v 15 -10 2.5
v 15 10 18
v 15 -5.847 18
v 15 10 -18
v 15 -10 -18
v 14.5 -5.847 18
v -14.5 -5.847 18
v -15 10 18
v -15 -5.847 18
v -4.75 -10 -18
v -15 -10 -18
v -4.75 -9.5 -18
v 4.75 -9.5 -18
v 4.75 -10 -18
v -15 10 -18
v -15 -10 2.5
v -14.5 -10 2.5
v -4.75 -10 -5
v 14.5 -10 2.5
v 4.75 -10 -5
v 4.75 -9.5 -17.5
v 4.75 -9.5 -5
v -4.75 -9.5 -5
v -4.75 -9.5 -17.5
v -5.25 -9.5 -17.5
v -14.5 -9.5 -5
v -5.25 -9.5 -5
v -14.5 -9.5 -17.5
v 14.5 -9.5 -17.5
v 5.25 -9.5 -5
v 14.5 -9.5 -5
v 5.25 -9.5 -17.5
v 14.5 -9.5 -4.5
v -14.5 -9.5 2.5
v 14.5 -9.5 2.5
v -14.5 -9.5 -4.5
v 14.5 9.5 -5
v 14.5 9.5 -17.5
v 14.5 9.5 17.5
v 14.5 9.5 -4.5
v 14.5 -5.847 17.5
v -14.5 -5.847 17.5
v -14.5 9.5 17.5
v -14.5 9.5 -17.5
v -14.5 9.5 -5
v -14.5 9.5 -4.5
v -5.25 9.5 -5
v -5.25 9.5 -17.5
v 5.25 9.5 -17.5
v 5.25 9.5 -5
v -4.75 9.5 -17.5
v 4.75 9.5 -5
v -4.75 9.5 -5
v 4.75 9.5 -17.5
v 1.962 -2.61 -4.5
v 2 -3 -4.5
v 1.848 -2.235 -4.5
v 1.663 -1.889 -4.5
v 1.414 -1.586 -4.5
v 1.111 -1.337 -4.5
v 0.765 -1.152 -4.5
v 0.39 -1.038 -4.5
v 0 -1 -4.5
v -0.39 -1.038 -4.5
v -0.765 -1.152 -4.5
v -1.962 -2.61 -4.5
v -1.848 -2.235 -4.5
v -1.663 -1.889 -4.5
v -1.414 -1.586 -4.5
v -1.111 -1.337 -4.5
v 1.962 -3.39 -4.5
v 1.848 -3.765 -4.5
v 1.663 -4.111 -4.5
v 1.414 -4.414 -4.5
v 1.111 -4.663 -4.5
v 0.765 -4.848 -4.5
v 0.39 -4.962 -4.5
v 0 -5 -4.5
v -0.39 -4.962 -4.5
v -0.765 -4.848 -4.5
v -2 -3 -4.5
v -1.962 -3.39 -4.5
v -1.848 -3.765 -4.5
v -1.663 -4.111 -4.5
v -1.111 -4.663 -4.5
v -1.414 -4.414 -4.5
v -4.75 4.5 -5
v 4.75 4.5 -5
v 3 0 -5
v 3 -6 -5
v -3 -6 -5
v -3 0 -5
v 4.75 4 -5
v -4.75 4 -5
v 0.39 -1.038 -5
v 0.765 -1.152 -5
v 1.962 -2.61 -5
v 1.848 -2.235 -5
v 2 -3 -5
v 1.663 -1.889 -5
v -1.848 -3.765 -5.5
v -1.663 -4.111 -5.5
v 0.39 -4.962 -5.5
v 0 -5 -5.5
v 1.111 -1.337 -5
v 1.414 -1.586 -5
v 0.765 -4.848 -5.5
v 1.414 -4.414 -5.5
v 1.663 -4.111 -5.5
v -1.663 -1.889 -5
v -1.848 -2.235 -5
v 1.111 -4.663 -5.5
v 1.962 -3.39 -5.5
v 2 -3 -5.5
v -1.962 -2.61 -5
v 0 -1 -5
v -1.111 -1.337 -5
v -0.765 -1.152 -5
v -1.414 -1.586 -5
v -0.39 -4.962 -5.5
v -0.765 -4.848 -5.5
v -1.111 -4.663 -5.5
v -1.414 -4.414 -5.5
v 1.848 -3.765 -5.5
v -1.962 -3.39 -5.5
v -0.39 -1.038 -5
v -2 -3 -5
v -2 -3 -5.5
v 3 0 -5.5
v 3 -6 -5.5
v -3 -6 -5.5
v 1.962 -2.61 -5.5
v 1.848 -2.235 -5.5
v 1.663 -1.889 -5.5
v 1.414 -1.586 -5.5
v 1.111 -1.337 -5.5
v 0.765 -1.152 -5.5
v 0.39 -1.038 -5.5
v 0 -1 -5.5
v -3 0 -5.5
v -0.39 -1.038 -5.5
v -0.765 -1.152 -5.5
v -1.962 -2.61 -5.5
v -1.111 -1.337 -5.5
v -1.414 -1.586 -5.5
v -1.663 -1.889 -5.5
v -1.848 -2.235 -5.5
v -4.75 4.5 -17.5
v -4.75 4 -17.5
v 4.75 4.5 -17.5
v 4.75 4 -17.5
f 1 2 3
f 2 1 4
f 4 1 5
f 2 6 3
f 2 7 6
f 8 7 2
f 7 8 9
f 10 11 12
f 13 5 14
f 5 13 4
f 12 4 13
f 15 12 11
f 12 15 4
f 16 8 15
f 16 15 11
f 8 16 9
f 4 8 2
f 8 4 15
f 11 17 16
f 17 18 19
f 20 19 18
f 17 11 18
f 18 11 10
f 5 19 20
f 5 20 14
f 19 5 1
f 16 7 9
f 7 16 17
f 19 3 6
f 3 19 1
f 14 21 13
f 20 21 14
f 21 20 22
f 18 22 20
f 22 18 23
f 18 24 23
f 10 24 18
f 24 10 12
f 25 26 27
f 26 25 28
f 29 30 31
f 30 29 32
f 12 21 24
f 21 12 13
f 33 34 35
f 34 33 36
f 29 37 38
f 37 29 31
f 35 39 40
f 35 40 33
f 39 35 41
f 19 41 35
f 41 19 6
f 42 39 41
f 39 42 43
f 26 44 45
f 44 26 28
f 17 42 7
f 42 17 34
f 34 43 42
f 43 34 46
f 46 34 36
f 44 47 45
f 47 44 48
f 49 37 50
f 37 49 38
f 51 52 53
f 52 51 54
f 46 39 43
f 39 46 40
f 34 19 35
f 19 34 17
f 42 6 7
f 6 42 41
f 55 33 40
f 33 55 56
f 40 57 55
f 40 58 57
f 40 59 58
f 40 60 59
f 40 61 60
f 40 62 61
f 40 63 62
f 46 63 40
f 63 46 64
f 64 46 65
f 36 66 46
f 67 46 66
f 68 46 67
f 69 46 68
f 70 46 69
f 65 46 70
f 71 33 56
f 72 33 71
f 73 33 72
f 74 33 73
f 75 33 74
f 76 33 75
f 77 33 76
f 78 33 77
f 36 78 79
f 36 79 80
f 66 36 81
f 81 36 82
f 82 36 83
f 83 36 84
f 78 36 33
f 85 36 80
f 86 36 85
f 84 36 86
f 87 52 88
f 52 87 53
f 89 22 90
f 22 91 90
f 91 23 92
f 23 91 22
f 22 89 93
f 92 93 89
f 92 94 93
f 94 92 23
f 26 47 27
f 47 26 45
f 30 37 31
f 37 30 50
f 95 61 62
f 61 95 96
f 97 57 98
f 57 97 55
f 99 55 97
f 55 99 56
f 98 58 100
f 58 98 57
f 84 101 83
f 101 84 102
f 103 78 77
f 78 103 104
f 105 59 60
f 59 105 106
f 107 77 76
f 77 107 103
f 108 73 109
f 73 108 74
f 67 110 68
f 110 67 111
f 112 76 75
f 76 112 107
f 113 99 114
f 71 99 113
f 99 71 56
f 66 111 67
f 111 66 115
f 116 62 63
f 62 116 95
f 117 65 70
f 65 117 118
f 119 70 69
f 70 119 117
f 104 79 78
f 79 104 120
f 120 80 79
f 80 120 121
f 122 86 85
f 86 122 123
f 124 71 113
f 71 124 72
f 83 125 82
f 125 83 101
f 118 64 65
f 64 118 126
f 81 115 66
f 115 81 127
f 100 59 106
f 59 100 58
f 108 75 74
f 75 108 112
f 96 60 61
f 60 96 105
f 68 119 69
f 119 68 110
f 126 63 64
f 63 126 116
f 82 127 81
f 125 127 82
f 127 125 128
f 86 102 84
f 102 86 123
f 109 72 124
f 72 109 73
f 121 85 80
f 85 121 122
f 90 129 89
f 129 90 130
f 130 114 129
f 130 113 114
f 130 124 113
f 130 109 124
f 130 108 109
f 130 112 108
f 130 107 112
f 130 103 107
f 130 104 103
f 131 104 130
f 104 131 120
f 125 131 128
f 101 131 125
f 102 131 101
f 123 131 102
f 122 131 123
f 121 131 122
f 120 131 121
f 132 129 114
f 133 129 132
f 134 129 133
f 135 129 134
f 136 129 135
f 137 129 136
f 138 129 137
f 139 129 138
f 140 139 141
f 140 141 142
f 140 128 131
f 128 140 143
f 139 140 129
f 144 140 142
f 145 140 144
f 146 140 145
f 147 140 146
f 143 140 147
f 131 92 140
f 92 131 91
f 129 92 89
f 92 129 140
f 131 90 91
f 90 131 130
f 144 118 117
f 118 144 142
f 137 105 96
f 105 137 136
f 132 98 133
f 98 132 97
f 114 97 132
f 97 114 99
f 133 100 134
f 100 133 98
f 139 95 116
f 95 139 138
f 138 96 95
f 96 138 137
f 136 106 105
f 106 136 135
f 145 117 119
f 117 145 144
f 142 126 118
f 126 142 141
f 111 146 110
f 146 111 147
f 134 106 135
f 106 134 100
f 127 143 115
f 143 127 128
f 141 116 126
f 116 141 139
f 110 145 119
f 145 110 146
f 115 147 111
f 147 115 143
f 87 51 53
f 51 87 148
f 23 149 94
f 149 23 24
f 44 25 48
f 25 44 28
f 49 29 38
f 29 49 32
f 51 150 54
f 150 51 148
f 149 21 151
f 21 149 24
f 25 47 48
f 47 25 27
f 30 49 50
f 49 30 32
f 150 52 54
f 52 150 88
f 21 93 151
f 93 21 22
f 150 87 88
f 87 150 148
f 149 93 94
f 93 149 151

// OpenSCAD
// Unit: inches
cabinet_width = 30;
cabinet_depth = 20;
cabinet_height = 36;
wall_thickness = 0.5;
door_height_y = 15;
door_angle = 15;
platform_y = 13;
reclaimed_powder_chute_diameter = 4;
reclaimed_powder_chute_inset = 5;
reclaimed_powder_channel_width = 9.5;
reclaimed_powder_channel_depth = 14;

module cabinet_top_and_walls(inset)
{
  door_cutout_depth = cabinet_depth + cabinet_height;
  door_cutout_height = cabinet_height / sin(door_angle) + 10;

  difference()
  {
    translate([0, 0, -0.5 * inset])
    cube([cabinet_width - 2 * inset, cabinet_depth - 2 * inset, cabinet_height - inset], center = true);
    
    translate([0, -0.5 * cabinet_depth, 0.5 * cabinet_height - wall_thickness - door_height_y])
    rotate([-door_angle, 0, 0])
    translate([0, -0.5 * door_cutout_depth, 0])
    cube([cabinet_width + 10, door_cutout_depth, door_cutout_height], center = true);
    
    translate([0, -0.5 * cabinet_depth, 0.5 * platform_y - 0.5 * cabinet_height])
    cube([reclaimed_powder_channel_width, 2 * wall_thickness, platform_y], center = true);
  }
}

cutaway_height = door_height_y + wall_thickness;
cutaway_inset = cutaway_height * tan(door_angle);

module opening()
{  
  translate([0, -cabinet_depth + cutaway_inset, 0.5 * cabinet_height- 0.5 * door_height_y - 0.5 * wall_thickness])
  cube([cabinet_width - 2 * wall_thickness, cabinet_depth, cutaway_height], center = true);
}

module platform()
{
  difference()
  {
    translate([0, 0, 0.5 * wall_thickness - 0.5 * cabinet_height + platform_y])
    cube([cabinet_width - 2 * wall_thickness, cabinet_depth - 2 * wall_thickness, wall_thickness], center = true);

    translate([0, 0.5 * reclaimed_powder_chute_diameter - 0.5 * cabinet_depth + reclaimed_powder_chute_inset, -0.5 * cabinet_height + platform_y])
    cylinder(2 * wall_thickness, d = reclaimed_powder_chute_diameter, center = true, $fn = 32);
  }
  
  translate([0, 0.5 * reclaimed_powder_chute_diameter - 0.5 * cabinet_depth + reclaimed_powder_chute_inset, 0.5 * wall_thickness - 0.5 * cabinet_height + platform_y - wall_thickness])
  difference()
  {
    cube([reclaimed_powder_chute_diameter + 2, reclaimed_powder_chute_diameter + 2, wall_thickness], center = true);
    cylinder(2 * wall_thickness, d = reclaimed_powder_chute_diameter, center = true, $fn = 32);
  }
}

module channel_walls()
{
  translate([-0.5 * (reclaimed_powder_channel_width + wall_thickness), 0, 0.5 * (platform_y - wall_thickness) - 0.5 * cabinet_height + wall_thickness])
  cube([wall_thickness, cabinet_depth - 2 * wall_thickness, platform_y - wall_thickness], center = true);
  translate([+0.5 * (reclaimed_powder_channel_width + wall_thickness), 0, 0.5 * (platform_y - wall_thickness) - 0.5 * cabinet_height + wall_thickness])
  cube([wall_thickness, cabinet_depth - 2 * wall_thickness, platform_y - wall_thickness], center = true);
  translate([0, 0.5 * wall_thickness - 0.5 * cabinet_depth + reclaimed_powder_channel_depth, 0.5 * (platform_y - wall_thickness) - 0.5 * cabinet_height + wall_thickness])
  cube([reclaimed_powder_channel_width, wall_thickness, platform_y - wall_thickness], center = true);
}

module cabinet_floor(width, height, depth)
{
  translate([0, 0, wall_thickness * 0.5 - cabinet_height * 0.5])
  cube([cabinet_width - 2 * wall_thickness, cabinet_depth - 2 * wall_thickness, wall_thickness], center = true);
}

module cabinet()
{
  difference()
  {
    cabinet_top_and_walls(0);
    cabinet_top_and_walls(wall_thickness);

    opening();
  }

  platform();
  
  channel_walls();
  
  cabinet_floor();
}

cabinet();

echo(str("Top piece: ", cabinet_width - 2 * wall_thickness, " x ", cabinet_depth - cutaway_inset));
echo(str("Left/right pieces: ", cabinet_depth, " x ", cabinet_height));
echo(str("=> Cutaway inset: ", cutaway_inset, " on x, ", door_height_y + wall_thickness, " on y"));
echo(str("Front piece: ", cabinet_width - 2 * wall_thickness, " x ", cabinet_height - door_height_y - wall_thickness));
echo(str("=> Cutaway: ", reclaimed_powder_channel_width, platform_y, " centered on bottom edge"));
echo(str("Back piece: ", cabinet_width - 2 * wall_thickness, " x ", cabinet_height - wall_thickness));
echo(str("Platform piece: ", cabinet_width - 2 * wall_thickness, " x ", cabinet_depth - 2 * wall_thickness));
echo(str("=> Chute: circle with diameter ", reclaimed_powder_chute_diameter, " centered, inset by ", reclaimed_powder_chute_inset, " (center of hole inset by ", reclaimed_powder_chute_inset + 0.5 * reclaimed_powder_chute_diameter));
echo(str("Filter retainer: ", reclaimed_powder_chute_diameter + 2, " x ", reclaimed_powder_chute_diameter + 2));
echo(str("Reclaimed powder channel:"));
echo(str("=> Walls (2): ", cabinet_depth - 2 * wall_thickness, " x ", platform_y - wall_thickness));
echo(str("=> Back: ", reclaimed_powder_channel_width, " x ", platform_y - wall_thickness));
echo(str("Bottom piece: ", cabinet_width - 2 * wall_thickness, " x ", cabinet_depth - wall_thickness));
echo(str("=> Tab with width ", reclaimed_powder_channel_width, " and depth ", wall_thickness, " centered on front edge"));
echo();
echo(str("Acrylic: ", cabinet_width, " x ", (door_height_y + wall_thickness) / cos(door_angle)));
/*
Top piece: 29 x 15.8468
Left/right pieces: 20 x 36
=> Cutaway inset: 4.15321 on x, 15.5 on y
Front piece: 29 x 20.5
=> Cutaway: 9.513 centered on bottom edge
Back piece: 29 x 35.5
Platform piece: 29 x 19
=> Chute: circle with diameter 4 centered, inset by 5 (center of hole inset by 7
Filter retainer: 6 x 6
Reclaimed powder channel:
=> Walls (2): 19 x 12.5
=> Back: 9.5 x 12.5
Bottom piece: 29 x 19.5
=> Tab with width 9.5 and depth 0.5 centered on front edge

Acrylic: 30 x 16.0468
*/
